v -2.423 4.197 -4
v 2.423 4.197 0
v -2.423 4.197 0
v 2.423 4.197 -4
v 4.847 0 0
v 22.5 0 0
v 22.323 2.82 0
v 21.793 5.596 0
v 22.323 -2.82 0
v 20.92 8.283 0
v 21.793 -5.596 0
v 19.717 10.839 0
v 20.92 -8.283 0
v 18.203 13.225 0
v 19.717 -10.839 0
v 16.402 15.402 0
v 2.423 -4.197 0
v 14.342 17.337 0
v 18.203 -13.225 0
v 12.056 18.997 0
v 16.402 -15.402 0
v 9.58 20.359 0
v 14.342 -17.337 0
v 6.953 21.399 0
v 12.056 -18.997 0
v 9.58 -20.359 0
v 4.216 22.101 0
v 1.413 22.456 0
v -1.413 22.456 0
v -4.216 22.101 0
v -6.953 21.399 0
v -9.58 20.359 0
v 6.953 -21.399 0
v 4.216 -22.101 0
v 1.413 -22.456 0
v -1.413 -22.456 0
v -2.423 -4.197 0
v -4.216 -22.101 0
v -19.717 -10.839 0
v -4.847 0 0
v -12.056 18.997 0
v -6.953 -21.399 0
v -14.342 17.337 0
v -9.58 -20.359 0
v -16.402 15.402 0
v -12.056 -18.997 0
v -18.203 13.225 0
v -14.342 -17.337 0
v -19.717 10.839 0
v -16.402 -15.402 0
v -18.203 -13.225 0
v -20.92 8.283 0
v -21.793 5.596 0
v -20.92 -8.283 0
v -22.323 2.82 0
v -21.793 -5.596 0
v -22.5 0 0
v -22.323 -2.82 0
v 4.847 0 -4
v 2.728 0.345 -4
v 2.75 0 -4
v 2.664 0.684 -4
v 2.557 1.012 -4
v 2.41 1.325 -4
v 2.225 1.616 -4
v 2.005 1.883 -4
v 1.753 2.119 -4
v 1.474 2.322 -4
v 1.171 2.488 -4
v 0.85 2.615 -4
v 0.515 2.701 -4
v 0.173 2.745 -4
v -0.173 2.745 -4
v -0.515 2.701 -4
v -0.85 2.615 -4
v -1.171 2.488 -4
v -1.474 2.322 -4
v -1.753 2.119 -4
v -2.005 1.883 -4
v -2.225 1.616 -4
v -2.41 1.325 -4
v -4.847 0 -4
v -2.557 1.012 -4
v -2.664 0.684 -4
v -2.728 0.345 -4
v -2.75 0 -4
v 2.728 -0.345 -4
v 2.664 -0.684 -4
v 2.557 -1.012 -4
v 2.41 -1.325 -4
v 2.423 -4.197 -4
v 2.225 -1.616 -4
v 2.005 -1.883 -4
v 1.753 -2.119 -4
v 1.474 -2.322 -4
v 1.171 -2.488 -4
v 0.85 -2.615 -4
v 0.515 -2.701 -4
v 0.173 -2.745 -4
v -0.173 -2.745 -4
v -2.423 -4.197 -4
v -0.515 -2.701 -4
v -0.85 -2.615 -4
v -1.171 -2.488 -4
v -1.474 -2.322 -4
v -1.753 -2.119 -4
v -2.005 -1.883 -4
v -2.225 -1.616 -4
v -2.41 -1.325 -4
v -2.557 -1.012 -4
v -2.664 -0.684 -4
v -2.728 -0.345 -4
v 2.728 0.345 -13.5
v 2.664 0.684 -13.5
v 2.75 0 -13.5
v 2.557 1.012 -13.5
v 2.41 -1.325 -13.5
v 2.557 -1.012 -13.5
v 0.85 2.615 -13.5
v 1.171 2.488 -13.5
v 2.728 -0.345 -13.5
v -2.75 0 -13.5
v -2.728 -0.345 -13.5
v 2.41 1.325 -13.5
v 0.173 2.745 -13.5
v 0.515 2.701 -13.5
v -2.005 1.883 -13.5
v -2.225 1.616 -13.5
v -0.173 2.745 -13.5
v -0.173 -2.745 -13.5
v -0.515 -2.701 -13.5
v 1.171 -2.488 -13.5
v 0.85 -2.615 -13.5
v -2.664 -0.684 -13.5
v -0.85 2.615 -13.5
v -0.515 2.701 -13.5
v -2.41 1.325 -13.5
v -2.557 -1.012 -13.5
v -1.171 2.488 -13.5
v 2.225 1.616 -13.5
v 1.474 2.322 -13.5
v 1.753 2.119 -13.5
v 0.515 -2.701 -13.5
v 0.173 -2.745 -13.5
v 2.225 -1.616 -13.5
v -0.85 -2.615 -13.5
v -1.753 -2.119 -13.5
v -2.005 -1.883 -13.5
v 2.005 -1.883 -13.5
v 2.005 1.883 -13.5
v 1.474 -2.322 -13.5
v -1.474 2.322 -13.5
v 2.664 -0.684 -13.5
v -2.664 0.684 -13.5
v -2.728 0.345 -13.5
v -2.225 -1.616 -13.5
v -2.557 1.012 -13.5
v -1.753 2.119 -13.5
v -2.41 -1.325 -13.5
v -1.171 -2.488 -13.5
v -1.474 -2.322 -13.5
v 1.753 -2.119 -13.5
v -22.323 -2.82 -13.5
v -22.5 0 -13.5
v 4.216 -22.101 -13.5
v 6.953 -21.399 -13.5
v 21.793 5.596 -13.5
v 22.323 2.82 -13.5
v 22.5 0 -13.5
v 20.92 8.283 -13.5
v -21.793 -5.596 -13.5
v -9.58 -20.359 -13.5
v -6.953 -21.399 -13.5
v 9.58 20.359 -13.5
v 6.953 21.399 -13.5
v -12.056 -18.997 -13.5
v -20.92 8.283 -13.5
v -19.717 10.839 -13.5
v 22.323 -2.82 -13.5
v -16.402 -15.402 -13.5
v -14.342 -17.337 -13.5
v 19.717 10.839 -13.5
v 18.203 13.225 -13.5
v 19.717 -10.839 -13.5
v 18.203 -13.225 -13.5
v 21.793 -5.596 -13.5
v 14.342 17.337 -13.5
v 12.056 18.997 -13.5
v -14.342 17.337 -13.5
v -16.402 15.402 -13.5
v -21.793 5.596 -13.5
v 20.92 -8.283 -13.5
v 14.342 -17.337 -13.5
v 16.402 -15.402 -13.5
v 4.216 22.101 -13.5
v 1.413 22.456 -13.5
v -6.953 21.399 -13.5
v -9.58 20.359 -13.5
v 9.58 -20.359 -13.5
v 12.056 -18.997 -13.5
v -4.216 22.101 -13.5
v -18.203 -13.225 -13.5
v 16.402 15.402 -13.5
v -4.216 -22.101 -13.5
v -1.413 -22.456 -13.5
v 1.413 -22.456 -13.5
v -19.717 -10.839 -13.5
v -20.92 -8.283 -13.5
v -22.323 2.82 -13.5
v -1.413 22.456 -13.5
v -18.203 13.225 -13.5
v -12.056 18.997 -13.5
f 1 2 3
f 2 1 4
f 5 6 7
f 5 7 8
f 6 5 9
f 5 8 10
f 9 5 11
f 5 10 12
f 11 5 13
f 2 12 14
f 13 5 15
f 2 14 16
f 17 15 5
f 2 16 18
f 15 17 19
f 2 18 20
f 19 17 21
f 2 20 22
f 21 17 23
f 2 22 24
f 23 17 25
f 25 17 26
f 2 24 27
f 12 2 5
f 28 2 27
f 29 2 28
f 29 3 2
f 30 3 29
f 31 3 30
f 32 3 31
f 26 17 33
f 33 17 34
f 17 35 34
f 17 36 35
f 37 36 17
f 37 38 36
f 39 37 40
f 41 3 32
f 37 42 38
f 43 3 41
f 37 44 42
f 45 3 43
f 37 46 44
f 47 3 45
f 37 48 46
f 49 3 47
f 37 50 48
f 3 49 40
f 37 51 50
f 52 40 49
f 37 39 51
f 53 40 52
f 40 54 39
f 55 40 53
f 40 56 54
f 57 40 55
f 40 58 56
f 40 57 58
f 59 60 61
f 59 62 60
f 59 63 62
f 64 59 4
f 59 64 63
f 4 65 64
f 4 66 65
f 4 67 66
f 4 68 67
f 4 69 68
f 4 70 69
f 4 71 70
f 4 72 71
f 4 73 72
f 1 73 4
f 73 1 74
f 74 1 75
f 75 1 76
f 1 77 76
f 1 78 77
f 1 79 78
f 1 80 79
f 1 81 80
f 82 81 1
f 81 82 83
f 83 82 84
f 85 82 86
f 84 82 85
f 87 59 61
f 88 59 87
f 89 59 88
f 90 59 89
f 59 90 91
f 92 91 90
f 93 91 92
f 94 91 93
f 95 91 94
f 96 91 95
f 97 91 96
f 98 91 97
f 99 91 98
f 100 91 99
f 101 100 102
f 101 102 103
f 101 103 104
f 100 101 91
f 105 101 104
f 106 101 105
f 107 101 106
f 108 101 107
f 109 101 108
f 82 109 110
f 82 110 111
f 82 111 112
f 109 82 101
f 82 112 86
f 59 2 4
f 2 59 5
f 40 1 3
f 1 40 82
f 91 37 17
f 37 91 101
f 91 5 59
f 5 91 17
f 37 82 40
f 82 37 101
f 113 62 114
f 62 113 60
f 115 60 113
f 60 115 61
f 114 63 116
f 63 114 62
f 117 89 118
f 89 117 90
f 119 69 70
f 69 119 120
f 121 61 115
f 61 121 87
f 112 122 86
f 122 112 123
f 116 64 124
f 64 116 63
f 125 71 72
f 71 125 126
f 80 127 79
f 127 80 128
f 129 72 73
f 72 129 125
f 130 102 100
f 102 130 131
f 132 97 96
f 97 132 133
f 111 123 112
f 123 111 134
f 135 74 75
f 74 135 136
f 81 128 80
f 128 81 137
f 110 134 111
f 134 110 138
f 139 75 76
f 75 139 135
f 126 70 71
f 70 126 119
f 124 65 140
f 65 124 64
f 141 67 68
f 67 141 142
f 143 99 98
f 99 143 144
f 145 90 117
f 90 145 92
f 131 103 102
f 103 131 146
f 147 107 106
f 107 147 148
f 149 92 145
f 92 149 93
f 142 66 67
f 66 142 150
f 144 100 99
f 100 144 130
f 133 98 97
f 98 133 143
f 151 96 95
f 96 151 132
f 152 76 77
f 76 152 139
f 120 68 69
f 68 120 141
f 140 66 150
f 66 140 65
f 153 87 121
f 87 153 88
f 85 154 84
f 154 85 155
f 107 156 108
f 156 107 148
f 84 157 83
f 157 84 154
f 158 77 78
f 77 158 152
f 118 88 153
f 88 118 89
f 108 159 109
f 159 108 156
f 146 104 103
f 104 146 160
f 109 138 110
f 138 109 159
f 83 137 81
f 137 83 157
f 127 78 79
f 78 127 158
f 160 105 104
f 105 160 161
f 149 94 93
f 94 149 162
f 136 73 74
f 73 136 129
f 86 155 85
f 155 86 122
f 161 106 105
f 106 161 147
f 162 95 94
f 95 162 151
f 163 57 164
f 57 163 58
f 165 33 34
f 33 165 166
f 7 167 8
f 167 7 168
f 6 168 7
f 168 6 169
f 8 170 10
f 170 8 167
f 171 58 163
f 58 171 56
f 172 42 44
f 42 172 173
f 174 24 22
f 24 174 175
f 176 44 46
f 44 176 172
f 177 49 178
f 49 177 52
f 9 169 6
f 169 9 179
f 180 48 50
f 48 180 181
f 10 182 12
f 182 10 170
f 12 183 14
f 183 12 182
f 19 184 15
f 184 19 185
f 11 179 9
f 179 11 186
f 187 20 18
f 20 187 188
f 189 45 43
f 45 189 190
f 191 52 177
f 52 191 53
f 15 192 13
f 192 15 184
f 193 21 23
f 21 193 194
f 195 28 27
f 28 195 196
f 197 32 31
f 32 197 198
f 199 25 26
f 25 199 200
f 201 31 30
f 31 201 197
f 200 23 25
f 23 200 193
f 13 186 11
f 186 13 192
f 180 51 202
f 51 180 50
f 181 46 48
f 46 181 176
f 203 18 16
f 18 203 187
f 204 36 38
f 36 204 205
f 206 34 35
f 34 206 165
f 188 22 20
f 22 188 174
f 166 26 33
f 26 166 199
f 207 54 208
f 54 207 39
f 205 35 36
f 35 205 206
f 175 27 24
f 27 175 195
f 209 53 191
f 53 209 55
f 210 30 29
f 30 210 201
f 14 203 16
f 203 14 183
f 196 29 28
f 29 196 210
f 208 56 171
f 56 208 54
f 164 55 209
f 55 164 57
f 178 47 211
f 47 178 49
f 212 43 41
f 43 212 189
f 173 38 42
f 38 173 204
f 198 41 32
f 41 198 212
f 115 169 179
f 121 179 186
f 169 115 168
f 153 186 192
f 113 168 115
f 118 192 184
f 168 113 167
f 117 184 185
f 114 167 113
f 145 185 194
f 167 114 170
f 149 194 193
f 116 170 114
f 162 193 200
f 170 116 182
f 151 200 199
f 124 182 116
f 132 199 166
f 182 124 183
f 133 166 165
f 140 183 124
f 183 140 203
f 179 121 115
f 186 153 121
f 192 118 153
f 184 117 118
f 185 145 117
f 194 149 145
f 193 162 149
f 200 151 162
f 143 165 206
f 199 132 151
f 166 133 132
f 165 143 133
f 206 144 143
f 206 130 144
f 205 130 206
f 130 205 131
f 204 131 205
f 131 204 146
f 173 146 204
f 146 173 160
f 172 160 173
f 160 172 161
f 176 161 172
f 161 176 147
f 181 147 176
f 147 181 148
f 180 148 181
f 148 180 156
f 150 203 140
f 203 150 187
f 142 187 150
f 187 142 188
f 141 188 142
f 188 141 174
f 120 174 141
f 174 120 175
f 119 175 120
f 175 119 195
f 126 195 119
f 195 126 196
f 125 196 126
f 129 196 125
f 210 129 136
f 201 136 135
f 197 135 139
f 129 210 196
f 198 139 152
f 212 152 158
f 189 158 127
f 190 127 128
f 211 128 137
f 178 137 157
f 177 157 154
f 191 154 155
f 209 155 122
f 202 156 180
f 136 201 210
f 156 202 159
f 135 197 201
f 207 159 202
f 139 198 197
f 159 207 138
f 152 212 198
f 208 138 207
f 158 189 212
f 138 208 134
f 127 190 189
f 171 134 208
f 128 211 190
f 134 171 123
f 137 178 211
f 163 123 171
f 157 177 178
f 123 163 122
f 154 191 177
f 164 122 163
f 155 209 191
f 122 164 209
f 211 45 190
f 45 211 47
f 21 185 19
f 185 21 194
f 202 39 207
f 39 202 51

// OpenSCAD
$fn = 50;


difference() {
	union() {
		translate(v = [0, 0, -13.5000000000]) {
			cylinder(h = 13.5000000000, r = 22.5000000000);
		}
	}
	union() {
		translate(v = [0, 0, 0]) {
			rotate(a = [0, 0, 0]) {
				difference() {
					union() {
						translate(v = [0, 0, -4]) {
							linear_extrude(height = 4) {
								polygon(points = [[4.8468000000, 0.0000000000], [2.4234000000, 4.1974519271], [-2.4234000000, 4.1974519271], [-4.8468000000, 0.0000000000], [-2.4234000000, -4.1974519271], [2.4234000000, -4.1974519271]]);
							}
						}
					}
					union();
				}
			}
		}
		#translate(v = [0, 0, -100.0000000000]) {
			cylinder(h = 200, r = 2.7500000000);
		}
	}
}
